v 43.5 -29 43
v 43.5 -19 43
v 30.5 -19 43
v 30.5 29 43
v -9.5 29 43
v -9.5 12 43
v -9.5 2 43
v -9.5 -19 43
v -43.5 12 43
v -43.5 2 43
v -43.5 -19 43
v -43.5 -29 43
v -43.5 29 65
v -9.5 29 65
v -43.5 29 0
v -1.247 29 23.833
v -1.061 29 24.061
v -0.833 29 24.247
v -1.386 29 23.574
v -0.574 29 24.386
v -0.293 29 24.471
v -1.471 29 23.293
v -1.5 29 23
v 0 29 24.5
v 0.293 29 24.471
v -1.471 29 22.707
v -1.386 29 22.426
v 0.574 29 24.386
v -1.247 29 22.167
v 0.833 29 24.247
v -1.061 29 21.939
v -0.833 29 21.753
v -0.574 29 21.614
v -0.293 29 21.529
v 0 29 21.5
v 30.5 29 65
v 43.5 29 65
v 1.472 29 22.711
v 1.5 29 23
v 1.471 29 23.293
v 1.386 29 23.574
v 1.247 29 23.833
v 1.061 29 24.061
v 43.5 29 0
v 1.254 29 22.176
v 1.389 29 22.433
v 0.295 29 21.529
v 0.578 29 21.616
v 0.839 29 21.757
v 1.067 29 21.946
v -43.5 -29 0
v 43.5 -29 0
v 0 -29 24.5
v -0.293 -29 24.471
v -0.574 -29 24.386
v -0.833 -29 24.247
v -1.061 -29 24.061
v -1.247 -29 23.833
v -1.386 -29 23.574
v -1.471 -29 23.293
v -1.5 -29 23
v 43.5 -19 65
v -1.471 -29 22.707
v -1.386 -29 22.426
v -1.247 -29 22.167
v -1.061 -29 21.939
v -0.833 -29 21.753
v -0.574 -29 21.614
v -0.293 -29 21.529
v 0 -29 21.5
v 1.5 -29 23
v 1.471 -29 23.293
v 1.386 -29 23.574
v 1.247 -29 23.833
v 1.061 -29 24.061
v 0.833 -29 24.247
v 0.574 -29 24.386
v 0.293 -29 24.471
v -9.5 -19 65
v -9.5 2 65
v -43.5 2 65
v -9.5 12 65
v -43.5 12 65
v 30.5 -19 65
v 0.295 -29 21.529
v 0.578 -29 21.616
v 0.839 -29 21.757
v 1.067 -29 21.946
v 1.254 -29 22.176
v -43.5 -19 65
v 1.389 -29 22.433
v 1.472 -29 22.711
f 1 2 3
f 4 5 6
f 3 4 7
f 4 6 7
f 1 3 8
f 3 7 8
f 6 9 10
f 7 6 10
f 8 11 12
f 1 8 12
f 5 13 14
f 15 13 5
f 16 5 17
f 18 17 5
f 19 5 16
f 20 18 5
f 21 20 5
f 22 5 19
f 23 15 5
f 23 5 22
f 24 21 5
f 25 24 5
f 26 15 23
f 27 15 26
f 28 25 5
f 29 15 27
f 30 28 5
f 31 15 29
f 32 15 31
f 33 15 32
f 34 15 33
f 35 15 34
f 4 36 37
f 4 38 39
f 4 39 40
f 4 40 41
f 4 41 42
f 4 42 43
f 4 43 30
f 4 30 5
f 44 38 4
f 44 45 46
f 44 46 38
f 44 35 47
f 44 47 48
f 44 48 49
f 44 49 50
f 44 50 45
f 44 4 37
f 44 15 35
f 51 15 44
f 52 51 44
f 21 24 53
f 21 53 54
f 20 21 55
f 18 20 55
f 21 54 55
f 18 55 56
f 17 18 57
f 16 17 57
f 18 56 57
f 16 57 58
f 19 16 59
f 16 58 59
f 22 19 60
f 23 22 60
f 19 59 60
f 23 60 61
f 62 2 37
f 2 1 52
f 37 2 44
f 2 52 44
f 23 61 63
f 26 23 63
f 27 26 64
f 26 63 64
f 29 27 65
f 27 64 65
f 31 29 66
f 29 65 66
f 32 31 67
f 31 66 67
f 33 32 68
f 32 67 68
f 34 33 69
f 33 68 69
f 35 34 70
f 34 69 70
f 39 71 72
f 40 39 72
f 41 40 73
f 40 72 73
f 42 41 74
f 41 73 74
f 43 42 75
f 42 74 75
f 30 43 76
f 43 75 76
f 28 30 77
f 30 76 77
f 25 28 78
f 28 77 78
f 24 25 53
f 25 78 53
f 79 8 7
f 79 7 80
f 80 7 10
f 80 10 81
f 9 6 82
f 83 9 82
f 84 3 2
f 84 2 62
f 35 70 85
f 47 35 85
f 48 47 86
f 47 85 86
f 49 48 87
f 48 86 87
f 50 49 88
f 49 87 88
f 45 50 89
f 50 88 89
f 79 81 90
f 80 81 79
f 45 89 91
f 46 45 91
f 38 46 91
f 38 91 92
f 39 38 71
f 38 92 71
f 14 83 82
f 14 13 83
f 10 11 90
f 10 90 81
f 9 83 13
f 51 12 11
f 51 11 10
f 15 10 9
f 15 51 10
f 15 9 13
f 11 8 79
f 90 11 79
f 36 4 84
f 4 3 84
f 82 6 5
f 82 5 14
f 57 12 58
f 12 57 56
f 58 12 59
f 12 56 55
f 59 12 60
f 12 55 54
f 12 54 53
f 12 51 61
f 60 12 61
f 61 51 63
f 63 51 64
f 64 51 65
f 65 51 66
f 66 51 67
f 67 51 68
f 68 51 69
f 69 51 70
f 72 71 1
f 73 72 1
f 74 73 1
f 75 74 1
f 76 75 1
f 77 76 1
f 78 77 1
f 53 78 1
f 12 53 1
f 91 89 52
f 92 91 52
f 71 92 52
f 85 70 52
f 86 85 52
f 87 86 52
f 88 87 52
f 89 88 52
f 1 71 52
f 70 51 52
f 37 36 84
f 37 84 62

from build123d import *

# Parameters (mm, degrees)
F0_W     = 87
F0_H     = 58
F1_DEPTH = 65
F2_W     = 10
F2_H     = 22
F3_DEPTH = 74
F4_W     = 9.5
F4_H     = 22
F4_W_2   = 30.5
F5_DEPTH = 58
F6_DEPTH = 90
F7_DEPTH = 99


with BuildPart() as f1:
    # F0 (on Top) → F1 (new body)
    with BuildSketch(Plane.XY):
        Rectangle(F0_W, F0_H)
    extrude(amount=F1_DEPTH)

    # F2 (on face) → F3 (cut)
    with BuildSketch(Plane(origin=(-43.5, 0, 0), x_dir=(0, -1, 0), z_dir=(-1, 0, 0))):
        with Locations((-7, 54)):
            Rectangle(F2_W, F2_H)
    extrude(amount=-F3_DEPTH, mode=Mode.SUBTRACT)

    # F4 (on face) → F5 (cut)
    with BuildSketch(Plane.XZ.offset(29)):
        with Locations((-4.75, 54)):
            Rectangle(F4_W, F4_H)
        with Locations((15.25, 54)):
            Rectangle(F4_W_2, F4_H)
    extrude(amount=-F5_DEPTH, mode=Mode.SUBTRACT)

    # F2 (on face) → F6 (cut)
    with BuildSketch(Plane(origin=(-43.5, 0, 0), x_dir=(0, -1, 0), z_dir=(-1, 0, 0))):
        with Locations((24, 54)):
            Rectangle(F2_W, F2_H)
    extrude(amount=-F6_DEPTH, mode=Mode.SUBTRACT)

    # F4 (on face) → F7 (cut)
    with BuildSketch(Plane.XZ.offset(29)):
        with BuildLine():
            ThreePointArc((1.5, 23), (1.0606601718, 24.0606601718), (0, 24.5))
            Line((0, 24.5), (0, 23))
            Line((0, 23), (1.5, 23))
        make_face()
        with BuildLine():
            ThreePointArc((0, 24.5), (-1.0606601718, 24.0606601718), (-1.5, 23))
            Line((-1.5, 23), (0, 23))
            Line((0, 23), (0, 24.5))
        make_face()
        with BuildLine():
            Line((0, 23), (-1.5, 23))
            ThreePointArc((-1.5, 23), (-1.0606601718, 21.9393398282), (0, 21.5))
            Line((0, 21.5), (0, 23))
        make_face()
        with BuildLine():
            Line((1.2536412571, 22.1763595454), (0, 23))
            Line((0, 23), (0, 21.5))
            ThreePointArc((0, 21.5), (0.7122286565, 21.6798748768), (1.2536412571, 22.1763595454))
        make_face()
        with BuildLine():
            Line((1.5, 23), (0, 23))
            Line((0, 23), (1.2536412571, 22.1763595454))
            ThreePointArc((1.2536412571, 22.1763595454), (1.4370911394, 22.5701522861), (1.5, 23))
        make_face()
    extrude(amount=-F7_DEPTH, mode=Mode.SUBTRACT)


solid = f1.part
